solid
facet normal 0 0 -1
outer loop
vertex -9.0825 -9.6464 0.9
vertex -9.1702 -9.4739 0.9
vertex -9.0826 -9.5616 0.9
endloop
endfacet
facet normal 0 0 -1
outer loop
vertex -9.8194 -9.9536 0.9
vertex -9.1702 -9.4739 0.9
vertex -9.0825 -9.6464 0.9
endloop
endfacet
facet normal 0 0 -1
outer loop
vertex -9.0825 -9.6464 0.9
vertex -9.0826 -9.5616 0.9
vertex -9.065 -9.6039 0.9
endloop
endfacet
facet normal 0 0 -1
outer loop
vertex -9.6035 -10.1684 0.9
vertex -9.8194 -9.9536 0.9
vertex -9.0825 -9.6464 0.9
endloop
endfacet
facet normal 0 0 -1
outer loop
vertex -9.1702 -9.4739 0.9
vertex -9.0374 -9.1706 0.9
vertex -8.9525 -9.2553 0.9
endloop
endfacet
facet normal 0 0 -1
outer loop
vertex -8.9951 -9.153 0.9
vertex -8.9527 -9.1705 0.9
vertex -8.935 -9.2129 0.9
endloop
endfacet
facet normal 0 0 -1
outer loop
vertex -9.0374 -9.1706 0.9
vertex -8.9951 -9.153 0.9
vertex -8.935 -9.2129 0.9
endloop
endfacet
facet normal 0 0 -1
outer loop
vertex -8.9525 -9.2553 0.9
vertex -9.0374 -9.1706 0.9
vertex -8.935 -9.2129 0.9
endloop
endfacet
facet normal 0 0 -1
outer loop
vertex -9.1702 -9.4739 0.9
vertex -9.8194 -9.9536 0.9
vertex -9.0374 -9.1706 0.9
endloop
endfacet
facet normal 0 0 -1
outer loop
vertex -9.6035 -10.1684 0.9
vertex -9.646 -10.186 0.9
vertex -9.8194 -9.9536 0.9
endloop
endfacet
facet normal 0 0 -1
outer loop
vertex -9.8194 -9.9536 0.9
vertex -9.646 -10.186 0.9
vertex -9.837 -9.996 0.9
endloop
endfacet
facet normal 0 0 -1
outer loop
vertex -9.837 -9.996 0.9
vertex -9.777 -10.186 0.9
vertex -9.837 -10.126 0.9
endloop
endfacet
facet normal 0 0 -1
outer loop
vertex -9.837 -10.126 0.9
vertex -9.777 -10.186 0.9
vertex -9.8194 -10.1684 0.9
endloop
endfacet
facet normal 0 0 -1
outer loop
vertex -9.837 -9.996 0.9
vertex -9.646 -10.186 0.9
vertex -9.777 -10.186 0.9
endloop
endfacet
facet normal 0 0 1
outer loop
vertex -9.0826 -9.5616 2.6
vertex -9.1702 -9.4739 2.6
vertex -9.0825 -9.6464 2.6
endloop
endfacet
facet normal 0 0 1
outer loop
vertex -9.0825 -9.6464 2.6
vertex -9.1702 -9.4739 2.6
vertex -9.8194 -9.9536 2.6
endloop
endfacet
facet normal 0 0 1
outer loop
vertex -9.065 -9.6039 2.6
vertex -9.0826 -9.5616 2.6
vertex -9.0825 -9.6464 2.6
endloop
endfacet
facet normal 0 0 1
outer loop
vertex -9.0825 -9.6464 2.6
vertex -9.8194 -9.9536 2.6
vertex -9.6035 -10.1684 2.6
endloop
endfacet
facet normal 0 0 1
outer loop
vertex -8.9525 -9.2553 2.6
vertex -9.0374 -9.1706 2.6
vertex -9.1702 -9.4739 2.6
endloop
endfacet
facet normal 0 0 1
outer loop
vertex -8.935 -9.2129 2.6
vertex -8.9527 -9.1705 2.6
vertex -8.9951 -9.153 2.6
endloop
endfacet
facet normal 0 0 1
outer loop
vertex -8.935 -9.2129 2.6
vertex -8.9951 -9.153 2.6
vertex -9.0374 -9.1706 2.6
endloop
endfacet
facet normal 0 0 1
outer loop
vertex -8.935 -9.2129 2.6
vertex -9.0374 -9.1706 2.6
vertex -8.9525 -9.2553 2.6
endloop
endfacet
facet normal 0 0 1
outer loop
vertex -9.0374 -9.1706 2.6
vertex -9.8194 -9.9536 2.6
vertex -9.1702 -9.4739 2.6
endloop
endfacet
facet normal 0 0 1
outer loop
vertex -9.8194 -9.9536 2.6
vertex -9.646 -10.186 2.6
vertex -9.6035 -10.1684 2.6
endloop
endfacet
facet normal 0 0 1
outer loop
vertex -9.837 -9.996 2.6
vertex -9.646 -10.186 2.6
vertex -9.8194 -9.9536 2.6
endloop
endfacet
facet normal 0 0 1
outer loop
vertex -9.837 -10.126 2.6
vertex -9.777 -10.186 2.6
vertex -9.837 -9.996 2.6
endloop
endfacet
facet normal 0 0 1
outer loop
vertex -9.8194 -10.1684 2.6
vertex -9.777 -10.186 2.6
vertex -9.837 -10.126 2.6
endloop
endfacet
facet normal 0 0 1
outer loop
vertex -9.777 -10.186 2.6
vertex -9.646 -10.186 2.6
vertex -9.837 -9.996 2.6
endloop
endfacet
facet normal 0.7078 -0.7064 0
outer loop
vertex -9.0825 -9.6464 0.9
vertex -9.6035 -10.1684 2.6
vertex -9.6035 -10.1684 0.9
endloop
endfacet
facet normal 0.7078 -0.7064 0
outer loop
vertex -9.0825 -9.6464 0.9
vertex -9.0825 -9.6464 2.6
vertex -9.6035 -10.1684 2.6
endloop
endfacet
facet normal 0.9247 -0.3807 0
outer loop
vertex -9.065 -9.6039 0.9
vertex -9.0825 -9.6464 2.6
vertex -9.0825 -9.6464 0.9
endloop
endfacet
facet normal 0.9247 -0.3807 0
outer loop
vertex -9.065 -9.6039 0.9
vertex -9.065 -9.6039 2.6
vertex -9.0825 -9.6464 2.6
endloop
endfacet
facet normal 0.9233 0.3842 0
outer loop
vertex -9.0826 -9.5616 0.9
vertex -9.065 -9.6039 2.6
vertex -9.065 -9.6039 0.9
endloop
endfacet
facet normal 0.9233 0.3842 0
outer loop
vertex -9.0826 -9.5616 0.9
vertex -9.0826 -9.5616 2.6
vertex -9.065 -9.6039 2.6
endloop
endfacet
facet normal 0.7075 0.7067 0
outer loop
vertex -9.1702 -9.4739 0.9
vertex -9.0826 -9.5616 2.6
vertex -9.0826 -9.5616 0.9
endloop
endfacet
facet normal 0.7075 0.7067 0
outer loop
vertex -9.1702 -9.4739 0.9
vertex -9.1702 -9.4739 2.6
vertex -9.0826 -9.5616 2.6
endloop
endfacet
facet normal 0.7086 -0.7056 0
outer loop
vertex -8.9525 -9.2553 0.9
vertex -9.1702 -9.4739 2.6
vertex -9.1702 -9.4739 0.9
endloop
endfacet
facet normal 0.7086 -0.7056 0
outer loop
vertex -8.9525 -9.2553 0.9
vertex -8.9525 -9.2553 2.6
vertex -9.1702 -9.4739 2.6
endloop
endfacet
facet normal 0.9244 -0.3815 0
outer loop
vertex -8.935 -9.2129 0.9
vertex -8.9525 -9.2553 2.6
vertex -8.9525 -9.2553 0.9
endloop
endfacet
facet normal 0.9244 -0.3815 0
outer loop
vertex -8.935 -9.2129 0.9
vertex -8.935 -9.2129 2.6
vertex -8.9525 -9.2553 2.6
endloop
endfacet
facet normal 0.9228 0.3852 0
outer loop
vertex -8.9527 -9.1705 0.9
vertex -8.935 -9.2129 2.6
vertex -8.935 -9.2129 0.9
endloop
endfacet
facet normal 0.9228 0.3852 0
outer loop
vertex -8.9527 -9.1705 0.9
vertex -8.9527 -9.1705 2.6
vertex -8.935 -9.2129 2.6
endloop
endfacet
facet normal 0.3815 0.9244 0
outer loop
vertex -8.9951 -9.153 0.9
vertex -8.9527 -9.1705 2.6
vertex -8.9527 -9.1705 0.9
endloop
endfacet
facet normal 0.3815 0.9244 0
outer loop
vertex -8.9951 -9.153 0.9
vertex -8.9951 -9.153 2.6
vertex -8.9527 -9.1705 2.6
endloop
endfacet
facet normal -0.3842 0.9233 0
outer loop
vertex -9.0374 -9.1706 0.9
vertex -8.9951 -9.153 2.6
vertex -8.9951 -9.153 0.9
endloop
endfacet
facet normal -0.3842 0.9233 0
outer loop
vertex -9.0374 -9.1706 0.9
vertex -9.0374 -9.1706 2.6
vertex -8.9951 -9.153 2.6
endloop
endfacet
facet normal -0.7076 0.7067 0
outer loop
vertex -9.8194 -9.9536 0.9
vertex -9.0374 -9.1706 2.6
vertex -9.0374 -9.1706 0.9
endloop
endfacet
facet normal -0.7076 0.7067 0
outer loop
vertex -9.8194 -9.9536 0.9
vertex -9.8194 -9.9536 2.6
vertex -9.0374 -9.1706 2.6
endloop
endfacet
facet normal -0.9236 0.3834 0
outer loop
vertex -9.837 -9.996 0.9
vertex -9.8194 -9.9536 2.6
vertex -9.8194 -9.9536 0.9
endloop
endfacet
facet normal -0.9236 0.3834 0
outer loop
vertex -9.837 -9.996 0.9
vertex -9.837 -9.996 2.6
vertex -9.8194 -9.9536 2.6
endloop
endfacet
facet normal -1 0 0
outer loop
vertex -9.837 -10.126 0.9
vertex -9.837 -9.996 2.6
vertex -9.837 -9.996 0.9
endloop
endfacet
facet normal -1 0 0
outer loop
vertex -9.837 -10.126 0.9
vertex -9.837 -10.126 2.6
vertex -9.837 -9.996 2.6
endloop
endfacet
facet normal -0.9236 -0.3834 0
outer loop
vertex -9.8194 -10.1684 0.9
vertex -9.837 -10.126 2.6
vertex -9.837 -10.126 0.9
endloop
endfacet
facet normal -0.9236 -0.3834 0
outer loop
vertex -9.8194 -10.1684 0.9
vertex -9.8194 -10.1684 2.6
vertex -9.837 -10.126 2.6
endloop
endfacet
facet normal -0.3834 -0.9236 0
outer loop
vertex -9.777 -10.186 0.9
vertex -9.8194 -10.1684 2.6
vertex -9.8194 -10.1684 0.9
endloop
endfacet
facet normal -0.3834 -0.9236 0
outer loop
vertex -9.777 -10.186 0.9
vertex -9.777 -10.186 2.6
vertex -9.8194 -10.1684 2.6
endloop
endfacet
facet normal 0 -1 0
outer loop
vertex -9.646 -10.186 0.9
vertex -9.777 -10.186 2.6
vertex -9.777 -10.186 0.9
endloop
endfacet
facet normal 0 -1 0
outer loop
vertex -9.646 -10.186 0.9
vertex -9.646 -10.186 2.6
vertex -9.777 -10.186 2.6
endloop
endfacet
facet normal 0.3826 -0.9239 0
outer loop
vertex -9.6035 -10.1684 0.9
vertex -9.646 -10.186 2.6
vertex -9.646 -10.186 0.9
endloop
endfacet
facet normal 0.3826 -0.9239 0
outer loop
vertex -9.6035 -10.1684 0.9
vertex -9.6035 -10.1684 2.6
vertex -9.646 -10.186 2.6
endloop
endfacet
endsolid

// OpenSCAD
$fn = 24;
translate([0, -2.500, 0.900])
  linear_extrude(height=1.700) {
offset(r=0.06, $fn=8) {
    polygon(points=[[-8.995,-6.713],[-9.777,-7.496],[-9.777,-7.626],[-9.646,-7.626],[-9.125,-7.104],[-9.255,-6.974]], paths=[[0,1,2,3,4,5]]);
}
}
